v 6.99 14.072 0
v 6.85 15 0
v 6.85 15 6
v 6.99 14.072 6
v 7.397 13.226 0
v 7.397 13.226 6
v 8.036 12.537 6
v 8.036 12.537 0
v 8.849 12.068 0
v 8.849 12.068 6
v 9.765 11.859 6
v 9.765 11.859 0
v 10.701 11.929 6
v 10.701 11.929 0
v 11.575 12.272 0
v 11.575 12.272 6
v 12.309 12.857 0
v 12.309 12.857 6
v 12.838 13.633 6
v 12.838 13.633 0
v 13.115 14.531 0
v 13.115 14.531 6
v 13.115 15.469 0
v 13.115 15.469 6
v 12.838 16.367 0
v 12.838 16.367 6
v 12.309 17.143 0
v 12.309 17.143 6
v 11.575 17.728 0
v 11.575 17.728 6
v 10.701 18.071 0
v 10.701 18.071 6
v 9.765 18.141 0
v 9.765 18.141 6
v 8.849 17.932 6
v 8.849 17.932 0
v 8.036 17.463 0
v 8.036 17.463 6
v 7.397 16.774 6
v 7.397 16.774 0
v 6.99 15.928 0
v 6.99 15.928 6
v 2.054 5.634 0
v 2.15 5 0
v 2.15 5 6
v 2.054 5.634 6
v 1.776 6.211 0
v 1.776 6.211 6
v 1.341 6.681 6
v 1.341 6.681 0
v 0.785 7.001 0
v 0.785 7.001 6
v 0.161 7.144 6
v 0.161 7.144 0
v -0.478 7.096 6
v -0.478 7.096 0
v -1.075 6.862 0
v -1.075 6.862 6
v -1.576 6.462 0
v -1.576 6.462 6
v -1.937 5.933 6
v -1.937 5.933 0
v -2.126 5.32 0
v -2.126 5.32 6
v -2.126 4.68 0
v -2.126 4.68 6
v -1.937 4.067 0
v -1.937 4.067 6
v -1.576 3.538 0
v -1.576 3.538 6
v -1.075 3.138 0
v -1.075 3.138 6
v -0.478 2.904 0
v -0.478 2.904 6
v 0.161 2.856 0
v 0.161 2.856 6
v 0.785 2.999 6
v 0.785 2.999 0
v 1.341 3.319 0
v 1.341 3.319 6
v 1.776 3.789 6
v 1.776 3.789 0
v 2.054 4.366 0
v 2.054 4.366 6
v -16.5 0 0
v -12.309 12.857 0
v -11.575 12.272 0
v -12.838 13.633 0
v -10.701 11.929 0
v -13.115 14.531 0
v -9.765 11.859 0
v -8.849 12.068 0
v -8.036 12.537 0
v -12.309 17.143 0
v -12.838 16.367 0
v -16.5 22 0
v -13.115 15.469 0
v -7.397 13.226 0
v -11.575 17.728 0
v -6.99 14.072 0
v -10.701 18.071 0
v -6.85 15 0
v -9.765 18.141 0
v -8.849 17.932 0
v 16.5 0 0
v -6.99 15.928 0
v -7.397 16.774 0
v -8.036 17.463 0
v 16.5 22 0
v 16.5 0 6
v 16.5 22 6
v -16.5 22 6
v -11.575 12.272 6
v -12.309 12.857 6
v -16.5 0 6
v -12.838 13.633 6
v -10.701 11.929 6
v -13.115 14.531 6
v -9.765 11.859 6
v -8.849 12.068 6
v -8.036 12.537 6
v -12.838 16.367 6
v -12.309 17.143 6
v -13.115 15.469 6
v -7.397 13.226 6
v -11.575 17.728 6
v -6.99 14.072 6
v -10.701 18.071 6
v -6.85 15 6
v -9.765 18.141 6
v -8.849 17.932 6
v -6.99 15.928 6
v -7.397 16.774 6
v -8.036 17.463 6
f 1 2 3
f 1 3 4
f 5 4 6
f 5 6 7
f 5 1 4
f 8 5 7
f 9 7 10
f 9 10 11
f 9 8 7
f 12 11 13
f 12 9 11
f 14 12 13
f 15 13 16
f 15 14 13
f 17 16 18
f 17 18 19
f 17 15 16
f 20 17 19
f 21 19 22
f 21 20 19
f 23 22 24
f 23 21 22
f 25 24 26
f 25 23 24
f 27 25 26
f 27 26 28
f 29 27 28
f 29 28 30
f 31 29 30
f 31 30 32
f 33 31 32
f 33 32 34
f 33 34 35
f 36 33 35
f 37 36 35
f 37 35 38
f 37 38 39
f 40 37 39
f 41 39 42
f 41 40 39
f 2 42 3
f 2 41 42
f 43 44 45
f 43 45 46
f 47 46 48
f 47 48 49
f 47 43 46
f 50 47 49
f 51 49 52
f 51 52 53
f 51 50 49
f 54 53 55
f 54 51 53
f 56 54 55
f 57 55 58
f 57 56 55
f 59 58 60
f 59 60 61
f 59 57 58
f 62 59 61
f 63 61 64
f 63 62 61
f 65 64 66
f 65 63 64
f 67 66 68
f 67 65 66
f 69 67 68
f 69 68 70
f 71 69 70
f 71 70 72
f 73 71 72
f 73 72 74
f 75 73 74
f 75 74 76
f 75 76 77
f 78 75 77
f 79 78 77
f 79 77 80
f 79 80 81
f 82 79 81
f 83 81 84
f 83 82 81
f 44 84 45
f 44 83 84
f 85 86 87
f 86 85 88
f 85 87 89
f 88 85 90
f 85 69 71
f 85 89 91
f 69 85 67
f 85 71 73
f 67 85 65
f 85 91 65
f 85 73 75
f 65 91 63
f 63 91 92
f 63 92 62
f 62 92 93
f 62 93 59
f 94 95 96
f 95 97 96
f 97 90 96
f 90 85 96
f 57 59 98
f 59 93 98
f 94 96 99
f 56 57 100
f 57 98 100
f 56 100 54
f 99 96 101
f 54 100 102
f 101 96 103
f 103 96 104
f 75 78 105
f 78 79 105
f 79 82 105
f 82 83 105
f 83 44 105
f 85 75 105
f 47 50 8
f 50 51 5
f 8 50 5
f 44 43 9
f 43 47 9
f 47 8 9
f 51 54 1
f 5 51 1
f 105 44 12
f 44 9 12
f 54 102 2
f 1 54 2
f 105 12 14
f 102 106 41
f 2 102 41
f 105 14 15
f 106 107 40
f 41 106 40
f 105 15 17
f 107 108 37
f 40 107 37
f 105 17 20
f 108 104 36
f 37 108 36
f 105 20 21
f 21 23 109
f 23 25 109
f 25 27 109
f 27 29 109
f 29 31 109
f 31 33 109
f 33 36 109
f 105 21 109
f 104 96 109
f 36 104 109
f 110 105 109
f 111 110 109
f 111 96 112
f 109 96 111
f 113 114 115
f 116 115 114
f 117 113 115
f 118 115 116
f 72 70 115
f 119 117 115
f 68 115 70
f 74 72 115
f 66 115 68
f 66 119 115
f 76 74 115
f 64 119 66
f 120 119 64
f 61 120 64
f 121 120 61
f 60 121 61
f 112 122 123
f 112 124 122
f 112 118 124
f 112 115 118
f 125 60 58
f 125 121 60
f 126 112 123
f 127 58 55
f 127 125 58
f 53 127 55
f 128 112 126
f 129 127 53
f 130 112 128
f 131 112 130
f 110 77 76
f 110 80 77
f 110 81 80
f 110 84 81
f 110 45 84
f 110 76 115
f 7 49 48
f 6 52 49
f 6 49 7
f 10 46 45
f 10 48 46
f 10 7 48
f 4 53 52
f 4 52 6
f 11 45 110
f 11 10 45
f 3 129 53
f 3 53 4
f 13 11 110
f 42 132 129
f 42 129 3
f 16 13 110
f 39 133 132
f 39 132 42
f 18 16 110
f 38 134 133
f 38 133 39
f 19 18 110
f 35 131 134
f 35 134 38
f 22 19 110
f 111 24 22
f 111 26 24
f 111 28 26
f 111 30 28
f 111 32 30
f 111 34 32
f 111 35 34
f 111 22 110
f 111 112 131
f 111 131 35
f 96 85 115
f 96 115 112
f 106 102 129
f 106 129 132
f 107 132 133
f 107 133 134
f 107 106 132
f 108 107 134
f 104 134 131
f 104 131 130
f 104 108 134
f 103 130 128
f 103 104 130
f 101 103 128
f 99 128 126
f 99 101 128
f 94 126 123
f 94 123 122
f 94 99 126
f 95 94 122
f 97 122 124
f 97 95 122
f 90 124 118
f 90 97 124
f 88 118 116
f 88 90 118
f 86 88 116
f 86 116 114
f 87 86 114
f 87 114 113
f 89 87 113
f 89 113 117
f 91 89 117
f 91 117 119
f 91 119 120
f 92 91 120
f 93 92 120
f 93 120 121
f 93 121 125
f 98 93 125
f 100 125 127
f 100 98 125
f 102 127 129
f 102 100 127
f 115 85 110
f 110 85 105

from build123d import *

# Parameters (mm, degrees)
SKETCH_1_W          = 33
SKETCH_1_H          = 22
EXTRUDE_1_DEPTH     = 6
SKETCH_2_R          = 3.15
SKETCH_2_R_2        = 2.15
CUT_EXTRUDE_1_DEPTH = 6


with BuildPart() as part:
    # 草图1 → 凸台-拉伸1 (new body)
    with BuildSketch(Plane.XY):
        with Locations((0, 11)):
            Rectangle(SKETCH_1_W, SKETCH_1_H)
    extrude(amount=EXTRUDE_1_DEPTH)

    # 草图2 → 切除-拉伸1 (cut)
    with BuildSketch(Plane.XY):
        with Locations((-10, 15)):
            Circle(SKETCH_2_R)
        with Locations((0, 5)):
            Circle(SKETCH_2_R_2)
        with Locations(Location((10, 15, 0), (0, 0, 180))):
            Circle(SKETCH_2_R)
    extrude(amount=CUT_EXTRUDE_1_DEPTH, mode=Mode.SUBTRACT)


solid = part.part
